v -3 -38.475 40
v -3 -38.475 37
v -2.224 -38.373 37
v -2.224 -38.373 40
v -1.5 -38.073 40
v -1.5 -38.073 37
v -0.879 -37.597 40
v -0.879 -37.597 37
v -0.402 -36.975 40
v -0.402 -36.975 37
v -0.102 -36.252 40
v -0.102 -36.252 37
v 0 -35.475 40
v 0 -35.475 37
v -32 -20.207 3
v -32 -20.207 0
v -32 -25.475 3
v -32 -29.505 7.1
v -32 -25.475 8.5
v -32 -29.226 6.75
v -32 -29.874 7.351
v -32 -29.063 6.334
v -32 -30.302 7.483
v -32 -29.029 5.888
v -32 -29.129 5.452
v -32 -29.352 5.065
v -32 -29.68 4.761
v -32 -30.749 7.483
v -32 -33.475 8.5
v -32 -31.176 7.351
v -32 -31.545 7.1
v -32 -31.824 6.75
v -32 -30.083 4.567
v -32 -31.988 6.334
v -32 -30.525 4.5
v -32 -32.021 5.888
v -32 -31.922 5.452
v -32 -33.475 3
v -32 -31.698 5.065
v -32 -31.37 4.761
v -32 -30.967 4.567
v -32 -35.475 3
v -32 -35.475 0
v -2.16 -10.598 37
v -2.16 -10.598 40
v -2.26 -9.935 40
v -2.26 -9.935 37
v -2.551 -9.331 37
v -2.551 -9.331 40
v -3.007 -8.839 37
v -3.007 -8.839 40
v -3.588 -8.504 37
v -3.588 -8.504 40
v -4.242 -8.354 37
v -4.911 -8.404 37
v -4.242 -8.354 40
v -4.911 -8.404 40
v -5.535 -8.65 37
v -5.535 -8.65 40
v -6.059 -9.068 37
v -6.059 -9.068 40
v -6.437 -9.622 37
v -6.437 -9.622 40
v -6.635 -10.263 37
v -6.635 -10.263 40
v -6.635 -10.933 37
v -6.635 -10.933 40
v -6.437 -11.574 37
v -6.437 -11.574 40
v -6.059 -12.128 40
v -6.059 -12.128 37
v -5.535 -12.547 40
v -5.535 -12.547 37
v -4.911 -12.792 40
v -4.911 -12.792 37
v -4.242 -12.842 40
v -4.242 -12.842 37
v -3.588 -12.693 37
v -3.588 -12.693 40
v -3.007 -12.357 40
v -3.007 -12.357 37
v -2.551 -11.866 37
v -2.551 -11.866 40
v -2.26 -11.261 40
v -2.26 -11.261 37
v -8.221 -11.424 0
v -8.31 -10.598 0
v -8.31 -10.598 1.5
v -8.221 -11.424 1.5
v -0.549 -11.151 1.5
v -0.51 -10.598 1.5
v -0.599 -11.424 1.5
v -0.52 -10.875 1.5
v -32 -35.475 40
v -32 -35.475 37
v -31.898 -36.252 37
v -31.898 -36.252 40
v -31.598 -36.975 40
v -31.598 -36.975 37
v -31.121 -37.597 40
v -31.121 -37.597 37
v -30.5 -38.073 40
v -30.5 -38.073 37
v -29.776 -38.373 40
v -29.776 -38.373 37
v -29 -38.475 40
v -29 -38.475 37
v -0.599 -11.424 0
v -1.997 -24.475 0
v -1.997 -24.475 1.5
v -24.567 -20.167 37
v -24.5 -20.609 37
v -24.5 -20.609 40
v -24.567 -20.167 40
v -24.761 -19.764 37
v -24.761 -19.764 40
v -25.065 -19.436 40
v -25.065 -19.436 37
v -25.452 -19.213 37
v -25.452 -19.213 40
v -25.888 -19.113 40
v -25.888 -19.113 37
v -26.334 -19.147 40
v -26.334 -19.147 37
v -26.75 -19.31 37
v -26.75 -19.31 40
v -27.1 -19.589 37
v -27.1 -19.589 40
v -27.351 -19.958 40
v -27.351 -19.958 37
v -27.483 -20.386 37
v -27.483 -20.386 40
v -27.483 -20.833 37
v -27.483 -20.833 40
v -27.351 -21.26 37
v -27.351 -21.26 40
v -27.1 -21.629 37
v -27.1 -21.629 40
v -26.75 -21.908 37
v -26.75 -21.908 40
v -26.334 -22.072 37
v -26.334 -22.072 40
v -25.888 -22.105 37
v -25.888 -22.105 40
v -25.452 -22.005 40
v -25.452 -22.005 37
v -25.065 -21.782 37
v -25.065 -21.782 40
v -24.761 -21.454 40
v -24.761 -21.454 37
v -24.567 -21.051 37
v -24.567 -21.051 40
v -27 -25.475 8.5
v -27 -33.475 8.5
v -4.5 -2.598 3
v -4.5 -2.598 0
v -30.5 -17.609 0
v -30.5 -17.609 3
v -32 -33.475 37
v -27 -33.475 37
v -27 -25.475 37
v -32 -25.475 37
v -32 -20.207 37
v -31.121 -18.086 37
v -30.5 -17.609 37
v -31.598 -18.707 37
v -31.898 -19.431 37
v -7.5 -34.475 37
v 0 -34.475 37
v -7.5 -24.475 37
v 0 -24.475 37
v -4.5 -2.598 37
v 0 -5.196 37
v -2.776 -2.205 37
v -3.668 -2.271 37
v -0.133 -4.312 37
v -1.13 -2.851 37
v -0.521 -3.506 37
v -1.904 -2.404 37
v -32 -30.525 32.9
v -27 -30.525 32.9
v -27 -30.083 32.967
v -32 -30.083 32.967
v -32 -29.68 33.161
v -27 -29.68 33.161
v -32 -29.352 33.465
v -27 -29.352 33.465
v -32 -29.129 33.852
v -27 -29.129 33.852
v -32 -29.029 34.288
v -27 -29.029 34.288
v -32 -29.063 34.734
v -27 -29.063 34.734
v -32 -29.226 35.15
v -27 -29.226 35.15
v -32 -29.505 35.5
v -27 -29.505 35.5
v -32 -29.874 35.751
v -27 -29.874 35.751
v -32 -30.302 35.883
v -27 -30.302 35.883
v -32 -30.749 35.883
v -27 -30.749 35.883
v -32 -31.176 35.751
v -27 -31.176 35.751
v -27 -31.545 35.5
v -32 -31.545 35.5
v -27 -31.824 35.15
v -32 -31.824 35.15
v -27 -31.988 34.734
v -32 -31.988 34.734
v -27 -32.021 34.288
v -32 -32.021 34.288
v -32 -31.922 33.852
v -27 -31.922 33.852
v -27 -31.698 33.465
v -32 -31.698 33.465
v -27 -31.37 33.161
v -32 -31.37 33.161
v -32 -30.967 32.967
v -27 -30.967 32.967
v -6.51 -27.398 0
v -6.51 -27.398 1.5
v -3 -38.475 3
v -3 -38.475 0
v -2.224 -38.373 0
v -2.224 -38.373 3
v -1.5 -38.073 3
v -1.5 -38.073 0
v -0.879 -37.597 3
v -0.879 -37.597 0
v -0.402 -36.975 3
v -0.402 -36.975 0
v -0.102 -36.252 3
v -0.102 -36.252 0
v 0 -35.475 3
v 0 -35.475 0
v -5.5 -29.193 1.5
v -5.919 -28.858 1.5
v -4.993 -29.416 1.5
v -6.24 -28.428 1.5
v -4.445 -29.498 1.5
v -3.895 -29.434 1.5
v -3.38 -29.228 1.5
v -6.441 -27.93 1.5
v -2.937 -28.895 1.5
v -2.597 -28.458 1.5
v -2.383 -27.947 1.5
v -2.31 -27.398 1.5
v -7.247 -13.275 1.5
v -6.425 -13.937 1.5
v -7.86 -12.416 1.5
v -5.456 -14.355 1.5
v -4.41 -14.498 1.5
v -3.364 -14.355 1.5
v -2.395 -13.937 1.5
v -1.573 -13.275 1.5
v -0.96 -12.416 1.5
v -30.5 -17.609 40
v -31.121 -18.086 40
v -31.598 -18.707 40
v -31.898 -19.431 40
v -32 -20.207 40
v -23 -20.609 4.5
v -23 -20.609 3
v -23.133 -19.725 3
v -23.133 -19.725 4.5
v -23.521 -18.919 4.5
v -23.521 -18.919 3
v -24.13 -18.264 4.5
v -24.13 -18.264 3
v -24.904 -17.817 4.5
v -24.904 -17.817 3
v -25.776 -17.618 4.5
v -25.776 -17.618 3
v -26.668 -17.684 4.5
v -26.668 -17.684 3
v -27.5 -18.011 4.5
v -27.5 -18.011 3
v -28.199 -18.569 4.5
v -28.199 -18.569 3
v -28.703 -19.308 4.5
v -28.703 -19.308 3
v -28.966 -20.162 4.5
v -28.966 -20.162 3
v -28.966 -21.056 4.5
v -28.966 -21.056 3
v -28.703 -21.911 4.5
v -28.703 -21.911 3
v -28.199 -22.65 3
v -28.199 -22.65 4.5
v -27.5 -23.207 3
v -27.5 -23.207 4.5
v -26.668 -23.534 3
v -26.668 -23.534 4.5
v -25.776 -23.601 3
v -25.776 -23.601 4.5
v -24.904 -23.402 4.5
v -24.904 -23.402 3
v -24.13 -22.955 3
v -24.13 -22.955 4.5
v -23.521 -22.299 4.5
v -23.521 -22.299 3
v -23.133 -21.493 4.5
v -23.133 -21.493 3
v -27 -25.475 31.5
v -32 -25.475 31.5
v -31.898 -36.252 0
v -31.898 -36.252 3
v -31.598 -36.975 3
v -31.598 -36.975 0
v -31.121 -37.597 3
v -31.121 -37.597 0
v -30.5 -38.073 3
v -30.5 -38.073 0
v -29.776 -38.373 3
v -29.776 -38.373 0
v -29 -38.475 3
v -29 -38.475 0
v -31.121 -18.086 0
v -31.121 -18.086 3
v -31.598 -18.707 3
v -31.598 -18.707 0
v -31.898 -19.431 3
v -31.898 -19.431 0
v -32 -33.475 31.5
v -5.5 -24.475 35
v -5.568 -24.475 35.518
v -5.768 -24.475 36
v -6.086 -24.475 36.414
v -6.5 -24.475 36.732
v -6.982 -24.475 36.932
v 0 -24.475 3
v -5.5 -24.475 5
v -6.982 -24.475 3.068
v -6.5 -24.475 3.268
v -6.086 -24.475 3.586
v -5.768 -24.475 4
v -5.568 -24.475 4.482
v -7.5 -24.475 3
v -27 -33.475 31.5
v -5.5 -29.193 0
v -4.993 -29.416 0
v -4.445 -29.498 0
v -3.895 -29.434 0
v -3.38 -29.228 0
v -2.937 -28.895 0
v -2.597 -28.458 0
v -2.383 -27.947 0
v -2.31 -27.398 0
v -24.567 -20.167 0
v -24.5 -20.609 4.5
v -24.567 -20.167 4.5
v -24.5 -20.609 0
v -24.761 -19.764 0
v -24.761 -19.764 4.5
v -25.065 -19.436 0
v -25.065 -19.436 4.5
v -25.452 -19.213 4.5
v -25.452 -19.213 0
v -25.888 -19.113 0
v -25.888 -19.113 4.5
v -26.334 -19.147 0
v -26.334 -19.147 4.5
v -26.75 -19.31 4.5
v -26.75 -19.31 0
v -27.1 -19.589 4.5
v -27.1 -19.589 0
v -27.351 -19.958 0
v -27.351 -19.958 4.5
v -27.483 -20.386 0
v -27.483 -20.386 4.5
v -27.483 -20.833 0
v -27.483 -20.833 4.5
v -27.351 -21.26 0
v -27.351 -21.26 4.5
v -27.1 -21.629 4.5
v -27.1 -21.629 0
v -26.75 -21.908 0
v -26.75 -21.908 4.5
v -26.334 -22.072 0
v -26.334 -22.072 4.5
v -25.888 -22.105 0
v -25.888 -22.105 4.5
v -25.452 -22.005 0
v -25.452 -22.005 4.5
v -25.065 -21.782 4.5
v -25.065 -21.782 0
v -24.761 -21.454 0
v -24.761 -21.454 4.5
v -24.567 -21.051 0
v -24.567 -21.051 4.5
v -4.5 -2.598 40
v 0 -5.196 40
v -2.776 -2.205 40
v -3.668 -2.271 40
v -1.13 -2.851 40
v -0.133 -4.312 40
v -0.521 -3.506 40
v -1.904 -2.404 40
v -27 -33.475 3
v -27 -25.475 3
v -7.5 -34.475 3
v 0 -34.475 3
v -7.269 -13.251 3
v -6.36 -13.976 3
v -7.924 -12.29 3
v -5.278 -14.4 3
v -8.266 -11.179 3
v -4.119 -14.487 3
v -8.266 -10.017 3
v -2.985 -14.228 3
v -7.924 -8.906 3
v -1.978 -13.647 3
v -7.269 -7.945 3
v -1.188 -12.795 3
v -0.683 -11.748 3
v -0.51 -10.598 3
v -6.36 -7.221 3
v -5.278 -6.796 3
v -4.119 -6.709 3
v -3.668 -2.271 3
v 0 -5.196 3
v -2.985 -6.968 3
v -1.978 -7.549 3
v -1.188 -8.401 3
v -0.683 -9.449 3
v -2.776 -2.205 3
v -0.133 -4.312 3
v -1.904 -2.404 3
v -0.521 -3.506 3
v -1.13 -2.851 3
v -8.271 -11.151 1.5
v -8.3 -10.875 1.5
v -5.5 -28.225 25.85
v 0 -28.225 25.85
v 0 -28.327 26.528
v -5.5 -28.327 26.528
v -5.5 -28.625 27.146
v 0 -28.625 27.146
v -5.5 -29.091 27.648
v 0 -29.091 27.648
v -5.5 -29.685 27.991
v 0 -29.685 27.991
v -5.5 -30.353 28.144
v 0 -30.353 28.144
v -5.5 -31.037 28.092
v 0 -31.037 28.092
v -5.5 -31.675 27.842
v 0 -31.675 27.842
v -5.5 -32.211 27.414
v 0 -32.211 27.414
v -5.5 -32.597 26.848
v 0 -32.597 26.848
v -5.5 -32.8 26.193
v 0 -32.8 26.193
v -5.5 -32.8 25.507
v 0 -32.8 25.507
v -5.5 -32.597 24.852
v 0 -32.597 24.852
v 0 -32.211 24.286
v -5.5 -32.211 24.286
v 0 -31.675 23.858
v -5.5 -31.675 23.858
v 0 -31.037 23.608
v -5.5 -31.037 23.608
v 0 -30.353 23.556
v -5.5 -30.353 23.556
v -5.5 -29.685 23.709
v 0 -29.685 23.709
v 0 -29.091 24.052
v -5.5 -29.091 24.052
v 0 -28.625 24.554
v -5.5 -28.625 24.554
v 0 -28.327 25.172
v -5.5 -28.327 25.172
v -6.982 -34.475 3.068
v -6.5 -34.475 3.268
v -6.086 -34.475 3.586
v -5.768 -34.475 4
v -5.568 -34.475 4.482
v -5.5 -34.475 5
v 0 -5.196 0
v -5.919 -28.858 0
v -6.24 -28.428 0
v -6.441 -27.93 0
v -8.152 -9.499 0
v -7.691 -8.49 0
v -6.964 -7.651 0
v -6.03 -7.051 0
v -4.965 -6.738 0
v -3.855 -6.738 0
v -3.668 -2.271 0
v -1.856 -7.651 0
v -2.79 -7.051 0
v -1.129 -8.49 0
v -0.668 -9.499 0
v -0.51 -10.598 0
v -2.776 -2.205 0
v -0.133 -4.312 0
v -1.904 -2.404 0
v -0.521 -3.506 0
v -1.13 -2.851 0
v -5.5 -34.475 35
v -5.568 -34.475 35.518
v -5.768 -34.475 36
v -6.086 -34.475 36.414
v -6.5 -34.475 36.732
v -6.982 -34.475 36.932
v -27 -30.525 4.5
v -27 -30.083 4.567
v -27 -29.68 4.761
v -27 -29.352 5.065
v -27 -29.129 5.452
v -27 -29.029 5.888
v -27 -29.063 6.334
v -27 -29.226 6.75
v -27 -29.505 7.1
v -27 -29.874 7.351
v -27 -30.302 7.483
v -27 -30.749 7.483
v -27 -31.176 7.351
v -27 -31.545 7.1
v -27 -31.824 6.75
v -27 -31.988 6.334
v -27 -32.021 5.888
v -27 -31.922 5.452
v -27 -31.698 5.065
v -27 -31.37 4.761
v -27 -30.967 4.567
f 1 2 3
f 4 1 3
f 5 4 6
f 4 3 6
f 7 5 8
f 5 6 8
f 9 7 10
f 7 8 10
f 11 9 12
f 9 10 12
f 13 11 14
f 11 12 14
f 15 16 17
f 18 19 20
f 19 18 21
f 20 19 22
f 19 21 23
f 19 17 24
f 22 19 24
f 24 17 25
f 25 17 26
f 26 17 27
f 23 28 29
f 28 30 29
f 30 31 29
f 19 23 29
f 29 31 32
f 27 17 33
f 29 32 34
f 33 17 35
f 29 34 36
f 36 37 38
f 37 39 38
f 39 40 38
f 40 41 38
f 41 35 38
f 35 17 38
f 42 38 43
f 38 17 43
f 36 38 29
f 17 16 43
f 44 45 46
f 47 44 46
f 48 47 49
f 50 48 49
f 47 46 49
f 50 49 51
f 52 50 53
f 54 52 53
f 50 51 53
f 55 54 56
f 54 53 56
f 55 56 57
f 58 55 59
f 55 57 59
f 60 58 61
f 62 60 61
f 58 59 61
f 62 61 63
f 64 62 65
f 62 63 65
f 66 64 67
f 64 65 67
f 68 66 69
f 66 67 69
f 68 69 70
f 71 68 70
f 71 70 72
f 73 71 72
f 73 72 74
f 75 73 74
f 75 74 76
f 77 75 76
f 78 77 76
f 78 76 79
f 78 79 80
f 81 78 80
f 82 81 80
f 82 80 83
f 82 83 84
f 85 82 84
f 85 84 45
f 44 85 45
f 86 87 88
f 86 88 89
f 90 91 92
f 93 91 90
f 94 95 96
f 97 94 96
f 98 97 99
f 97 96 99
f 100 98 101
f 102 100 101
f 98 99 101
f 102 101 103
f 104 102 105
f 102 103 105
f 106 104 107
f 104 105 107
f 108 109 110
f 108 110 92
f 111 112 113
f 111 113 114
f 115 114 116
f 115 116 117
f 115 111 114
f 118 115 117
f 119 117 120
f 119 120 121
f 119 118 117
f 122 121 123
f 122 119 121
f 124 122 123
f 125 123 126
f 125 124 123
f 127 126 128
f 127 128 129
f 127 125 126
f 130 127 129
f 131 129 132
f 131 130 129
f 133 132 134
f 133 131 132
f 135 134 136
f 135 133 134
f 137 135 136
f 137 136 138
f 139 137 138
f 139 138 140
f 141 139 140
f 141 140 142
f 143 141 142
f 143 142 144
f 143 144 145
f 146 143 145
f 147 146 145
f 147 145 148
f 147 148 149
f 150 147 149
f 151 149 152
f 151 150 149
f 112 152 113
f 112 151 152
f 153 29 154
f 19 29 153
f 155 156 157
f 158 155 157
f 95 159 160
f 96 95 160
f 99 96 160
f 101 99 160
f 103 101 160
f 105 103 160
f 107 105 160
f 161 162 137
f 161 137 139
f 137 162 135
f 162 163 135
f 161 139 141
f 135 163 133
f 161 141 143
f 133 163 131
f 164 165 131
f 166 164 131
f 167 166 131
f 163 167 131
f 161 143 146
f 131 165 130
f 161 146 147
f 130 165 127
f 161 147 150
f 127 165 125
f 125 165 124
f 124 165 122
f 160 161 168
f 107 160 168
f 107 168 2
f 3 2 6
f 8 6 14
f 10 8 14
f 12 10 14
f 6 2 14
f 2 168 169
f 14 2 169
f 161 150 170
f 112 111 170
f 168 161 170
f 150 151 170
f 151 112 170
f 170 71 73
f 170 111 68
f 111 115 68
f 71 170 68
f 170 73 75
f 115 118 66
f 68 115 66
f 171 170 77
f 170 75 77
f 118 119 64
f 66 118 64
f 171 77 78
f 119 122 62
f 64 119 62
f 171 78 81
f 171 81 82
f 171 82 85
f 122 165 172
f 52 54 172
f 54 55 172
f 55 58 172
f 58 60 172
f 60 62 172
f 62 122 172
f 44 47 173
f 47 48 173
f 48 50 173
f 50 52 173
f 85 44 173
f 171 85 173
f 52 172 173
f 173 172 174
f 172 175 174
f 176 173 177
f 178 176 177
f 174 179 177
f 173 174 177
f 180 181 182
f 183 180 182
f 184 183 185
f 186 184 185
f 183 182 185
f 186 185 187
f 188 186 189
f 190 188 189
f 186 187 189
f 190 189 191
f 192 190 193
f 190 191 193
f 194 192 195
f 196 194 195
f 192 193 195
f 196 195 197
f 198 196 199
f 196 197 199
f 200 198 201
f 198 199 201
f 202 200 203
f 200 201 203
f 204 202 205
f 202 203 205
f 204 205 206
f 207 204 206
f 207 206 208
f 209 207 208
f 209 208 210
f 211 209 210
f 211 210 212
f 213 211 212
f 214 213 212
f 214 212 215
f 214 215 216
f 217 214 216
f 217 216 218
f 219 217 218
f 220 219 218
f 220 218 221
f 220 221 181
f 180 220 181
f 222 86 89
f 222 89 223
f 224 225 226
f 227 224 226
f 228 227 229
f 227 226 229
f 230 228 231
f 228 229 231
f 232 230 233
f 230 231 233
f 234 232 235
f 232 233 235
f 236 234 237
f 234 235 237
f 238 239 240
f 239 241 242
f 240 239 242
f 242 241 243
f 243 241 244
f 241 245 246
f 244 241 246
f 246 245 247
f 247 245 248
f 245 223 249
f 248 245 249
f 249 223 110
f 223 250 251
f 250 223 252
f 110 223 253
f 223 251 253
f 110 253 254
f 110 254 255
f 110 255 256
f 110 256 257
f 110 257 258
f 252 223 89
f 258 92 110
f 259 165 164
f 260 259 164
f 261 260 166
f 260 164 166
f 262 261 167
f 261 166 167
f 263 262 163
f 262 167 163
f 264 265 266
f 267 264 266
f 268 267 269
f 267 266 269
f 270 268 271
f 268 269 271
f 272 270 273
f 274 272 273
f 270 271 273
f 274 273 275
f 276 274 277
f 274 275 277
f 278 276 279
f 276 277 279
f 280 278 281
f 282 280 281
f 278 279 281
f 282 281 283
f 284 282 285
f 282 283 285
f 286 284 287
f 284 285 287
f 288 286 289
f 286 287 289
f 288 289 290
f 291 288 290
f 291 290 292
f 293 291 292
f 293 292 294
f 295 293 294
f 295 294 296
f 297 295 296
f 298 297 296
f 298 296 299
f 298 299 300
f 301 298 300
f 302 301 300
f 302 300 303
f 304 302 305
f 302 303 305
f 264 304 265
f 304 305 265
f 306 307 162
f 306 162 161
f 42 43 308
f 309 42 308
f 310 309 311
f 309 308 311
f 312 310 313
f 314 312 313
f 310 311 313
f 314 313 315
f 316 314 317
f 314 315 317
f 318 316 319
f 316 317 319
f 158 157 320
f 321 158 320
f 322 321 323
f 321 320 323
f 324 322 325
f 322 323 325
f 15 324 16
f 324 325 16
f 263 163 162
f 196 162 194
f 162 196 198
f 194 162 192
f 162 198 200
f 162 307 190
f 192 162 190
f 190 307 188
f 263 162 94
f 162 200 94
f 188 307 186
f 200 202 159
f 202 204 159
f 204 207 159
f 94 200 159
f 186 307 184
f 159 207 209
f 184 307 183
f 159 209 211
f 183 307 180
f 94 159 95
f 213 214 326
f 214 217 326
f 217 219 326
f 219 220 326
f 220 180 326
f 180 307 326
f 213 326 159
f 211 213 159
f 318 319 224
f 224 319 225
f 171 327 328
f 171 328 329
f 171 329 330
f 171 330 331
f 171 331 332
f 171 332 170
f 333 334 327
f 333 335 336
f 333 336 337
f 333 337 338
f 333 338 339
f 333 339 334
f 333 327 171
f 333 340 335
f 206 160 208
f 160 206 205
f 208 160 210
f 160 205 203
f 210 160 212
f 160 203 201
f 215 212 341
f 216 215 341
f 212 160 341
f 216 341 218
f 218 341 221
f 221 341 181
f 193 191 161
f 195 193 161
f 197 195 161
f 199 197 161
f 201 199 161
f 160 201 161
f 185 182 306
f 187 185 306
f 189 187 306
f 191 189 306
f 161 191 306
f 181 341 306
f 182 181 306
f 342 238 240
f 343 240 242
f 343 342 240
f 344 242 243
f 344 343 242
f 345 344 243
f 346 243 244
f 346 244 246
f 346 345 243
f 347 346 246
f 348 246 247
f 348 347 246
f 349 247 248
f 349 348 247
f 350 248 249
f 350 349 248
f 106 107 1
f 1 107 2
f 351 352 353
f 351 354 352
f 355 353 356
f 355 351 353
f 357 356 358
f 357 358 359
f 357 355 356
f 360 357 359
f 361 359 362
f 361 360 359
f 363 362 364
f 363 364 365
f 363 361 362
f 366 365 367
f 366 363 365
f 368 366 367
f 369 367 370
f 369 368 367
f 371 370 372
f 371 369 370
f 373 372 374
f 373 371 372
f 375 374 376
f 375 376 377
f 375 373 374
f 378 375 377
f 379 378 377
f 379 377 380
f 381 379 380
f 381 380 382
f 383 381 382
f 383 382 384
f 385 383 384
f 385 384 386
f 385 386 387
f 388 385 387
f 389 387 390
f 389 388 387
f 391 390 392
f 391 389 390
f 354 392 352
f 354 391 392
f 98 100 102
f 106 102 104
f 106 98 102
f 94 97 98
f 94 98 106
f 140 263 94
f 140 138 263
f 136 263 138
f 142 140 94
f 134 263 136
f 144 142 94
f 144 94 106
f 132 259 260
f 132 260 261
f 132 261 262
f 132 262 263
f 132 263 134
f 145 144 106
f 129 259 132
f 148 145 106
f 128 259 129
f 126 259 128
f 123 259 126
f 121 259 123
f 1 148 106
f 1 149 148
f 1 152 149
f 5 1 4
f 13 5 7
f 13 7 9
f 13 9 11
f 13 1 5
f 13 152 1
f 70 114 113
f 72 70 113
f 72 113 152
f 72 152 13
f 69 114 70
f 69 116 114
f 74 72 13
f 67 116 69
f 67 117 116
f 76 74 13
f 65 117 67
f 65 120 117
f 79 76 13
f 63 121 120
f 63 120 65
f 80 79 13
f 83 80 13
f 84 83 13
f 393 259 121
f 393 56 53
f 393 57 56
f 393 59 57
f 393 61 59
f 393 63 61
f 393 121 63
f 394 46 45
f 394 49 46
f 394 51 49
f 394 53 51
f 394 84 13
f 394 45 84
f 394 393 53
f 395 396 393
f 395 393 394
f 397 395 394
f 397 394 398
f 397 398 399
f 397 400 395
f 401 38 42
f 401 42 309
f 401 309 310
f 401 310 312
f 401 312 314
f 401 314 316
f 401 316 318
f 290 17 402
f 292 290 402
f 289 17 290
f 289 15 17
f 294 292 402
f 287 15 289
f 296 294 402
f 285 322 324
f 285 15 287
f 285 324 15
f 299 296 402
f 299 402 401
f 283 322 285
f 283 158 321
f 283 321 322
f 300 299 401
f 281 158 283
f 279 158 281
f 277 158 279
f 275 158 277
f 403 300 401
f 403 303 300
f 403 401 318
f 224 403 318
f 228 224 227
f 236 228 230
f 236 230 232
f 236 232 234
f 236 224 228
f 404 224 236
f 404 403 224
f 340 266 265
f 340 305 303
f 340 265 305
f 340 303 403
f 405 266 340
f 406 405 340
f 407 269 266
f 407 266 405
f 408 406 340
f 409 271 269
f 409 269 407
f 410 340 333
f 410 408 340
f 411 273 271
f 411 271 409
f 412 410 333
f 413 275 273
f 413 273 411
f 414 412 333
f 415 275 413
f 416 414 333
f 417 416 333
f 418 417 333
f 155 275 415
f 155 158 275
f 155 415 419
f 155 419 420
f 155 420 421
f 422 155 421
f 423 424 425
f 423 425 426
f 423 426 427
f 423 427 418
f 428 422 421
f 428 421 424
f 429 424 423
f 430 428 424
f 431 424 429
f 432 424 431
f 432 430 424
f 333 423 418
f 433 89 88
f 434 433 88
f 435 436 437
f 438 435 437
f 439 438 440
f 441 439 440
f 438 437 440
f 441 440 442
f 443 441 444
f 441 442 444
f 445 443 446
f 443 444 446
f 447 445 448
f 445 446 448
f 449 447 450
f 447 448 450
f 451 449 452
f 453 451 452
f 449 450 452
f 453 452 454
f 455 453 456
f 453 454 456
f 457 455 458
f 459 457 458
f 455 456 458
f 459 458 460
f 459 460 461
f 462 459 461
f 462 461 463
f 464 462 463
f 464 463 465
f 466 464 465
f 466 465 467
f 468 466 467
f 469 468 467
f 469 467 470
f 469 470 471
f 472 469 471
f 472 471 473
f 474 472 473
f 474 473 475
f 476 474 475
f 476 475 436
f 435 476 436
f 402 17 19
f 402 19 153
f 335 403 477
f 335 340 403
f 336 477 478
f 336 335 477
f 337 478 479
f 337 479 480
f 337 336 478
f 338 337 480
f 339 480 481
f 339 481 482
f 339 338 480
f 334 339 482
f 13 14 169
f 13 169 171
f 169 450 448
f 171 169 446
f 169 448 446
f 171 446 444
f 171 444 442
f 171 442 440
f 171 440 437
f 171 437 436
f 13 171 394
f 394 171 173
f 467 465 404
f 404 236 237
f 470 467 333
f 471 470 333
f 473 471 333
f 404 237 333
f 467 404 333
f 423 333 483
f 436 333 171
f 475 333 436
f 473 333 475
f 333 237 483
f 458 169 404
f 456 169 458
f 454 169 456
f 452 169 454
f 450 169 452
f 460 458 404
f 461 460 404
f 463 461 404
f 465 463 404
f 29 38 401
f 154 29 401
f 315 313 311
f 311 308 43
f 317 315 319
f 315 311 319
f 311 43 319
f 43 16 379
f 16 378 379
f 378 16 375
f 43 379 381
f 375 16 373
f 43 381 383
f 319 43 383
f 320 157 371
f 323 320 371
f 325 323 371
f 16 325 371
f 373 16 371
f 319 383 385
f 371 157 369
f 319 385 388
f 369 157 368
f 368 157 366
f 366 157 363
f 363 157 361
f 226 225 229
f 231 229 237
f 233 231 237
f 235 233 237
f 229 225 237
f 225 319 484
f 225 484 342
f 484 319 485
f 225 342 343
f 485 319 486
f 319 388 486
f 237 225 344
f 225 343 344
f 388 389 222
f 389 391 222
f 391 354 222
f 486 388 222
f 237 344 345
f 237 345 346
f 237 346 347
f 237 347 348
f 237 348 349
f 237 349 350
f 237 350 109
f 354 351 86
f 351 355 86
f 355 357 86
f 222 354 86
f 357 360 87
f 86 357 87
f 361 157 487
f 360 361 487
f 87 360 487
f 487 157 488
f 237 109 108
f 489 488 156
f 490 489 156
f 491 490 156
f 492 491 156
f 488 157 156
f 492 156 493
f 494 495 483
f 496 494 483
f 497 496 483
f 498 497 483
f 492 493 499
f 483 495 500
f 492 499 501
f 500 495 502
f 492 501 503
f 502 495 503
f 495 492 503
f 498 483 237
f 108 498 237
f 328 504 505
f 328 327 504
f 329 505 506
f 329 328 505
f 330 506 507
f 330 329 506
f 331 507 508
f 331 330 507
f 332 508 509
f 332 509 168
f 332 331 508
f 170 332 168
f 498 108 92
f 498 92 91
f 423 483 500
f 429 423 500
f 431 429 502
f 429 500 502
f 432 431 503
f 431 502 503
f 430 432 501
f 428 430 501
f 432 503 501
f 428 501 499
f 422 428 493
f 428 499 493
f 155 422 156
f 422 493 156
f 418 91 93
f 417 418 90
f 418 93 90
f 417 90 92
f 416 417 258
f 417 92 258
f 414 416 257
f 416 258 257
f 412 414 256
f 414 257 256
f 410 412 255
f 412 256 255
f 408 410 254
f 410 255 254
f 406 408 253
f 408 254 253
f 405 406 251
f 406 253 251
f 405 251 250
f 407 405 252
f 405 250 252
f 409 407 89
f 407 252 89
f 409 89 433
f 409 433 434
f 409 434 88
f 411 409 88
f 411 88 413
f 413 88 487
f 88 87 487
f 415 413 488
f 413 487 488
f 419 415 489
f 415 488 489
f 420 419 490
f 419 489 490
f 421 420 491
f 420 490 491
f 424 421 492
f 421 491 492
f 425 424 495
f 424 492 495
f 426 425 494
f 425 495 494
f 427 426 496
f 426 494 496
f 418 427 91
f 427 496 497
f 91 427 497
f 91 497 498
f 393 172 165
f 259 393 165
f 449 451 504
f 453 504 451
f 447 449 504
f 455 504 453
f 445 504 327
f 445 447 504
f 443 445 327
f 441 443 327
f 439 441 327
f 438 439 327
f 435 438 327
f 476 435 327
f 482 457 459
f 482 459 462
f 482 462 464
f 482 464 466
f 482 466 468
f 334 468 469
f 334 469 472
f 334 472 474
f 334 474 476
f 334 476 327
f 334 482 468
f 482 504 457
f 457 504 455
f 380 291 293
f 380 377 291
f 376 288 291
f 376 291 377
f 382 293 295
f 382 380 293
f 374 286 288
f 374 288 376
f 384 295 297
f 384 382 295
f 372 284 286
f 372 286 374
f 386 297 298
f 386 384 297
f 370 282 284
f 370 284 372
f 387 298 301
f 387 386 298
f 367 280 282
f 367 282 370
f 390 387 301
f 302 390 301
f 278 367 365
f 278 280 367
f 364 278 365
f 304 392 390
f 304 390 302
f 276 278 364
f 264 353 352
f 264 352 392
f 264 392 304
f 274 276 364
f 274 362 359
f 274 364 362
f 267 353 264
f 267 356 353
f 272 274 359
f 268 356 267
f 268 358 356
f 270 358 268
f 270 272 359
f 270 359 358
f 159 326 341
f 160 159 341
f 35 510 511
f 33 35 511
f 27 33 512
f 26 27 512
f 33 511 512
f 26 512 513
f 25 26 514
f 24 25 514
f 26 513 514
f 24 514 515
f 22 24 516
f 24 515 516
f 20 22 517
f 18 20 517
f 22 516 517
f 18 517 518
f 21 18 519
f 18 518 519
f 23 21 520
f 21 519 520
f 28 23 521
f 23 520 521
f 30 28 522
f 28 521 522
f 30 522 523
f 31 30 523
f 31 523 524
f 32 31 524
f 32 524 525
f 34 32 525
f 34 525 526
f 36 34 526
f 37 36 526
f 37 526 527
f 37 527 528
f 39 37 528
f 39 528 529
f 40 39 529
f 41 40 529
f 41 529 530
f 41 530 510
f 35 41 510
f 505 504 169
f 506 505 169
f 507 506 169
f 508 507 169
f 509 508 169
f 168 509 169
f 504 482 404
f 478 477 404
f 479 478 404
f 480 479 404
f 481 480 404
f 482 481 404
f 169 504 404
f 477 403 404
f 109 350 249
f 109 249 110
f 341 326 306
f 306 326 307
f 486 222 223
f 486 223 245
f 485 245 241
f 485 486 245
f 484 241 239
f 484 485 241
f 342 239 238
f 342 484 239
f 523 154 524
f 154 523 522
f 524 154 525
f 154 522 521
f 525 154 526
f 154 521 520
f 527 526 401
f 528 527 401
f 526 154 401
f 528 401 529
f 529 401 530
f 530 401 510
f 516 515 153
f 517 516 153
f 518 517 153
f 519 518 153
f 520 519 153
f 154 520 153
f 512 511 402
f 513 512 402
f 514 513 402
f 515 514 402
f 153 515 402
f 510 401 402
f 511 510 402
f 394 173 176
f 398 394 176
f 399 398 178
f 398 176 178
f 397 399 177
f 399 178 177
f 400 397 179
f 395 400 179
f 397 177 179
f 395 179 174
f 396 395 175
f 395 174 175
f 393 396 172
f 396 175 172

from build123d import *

# Parameters (mm, degrees)
SKETCH1_R           = 1.5
BOSS_EXTRUDE1_DEPTH = 3
SKETCH2_W           = 5
SKETCH2_H           = 8
BOSS_EXTRUDE2_DEPTH = 34
LPATTERN1_COUNT     = 2
LPATTERN1_PITCH     = 37
SKETCH3_W           = 5.5
SKETCH3_H           = 10
BOSS_EXTRUDE4_DEPTH = 34
SKETCH5_W           = 23
SKETCH5_H           = 8
CUT_EXTRUDE1_DEPTH  = 10
CUT_EXTRUDE11_START = -3.7
SKETCH9_R           = 1.5
CUT_EXTRUDE11_DEPTH = 2.2
SKETCH11_R          = 3
SKETCH11_R_2        = 1.5
BOSS_EXTRUDE5_DEPTH = 1.5
SKETCH12_R          = 1.5
CUT_EXTRUDE13_DEPTH = 62.719864532
SKETCH14_R          = 3.9
CUT_EXTRUDE15_DEPTH = 10
SKETCH15_R          = 2.3
CUT_EXTRUDE16_DEPTH = 65.065136212
SKETCH16_R          = 2.25
CUT_EXTRUDE17_DEPTH = 65.065136212
FILLET1_R           = 2


with BuildPart() as part:
    # Sketch1 → Boss-Extrude1 (new body)
    with BuildSketch(Plane.XY):
        with BuildLine():
            Line((-4.5, -2.598076211), (-30.5, -17.60918321))
            ThreePointArc((-30.5, -17.60918321), (-31.598076211, -18.707259422), (-32, -20.207259422))
            Line((-32, -20.207259422), (-32, -35.475208614))
            ThreePointArc((-32, -35.475208614), (-31.121320344, -37.596528958), (-29, -38.475208614))
            Line((-29, -38.475208614), (-3, -38.475208614))
            ThreePointArc((-3, -38.475208614), (-0.878679656, -37.596528958), (0, -35.475208614))
            Line((0, -35.475208614), (0, -5.196152423))
            ThreePointArc((0, -5.196152423), (-1.5, -2.598076211), (-4.5, -2.598076211))
        make_face()
        with Locations((-26, -20.60918321)):
            Circle(SKETCH1_R, mode=Mode.SUBTRACT)
        with Locations((-4.41, -10.598076211)):
            Circle(SKETCH1_R, mode=Mode.SUBTRACT)
    boss_extrude1 = extrude(amount=BOSS_EXTRUDE1_DEPTH)

    # Sketch2 → Boss-Extrude2 (add)
    with BuildSketch(Plane.XY.offset(3)):
        with Locations((-29.5, -29.475208614)):
            Rectangle(SKETCH2_W, SKETCH2_H)
    extrude(amount=BOSS_EXTRUDE2_DEPTH)

    # LPattern1: Boss-Extrude1 ×2
    with Locations(*[(0, 0, i * LPATTERN1_PITCH) for i in range(1, LPATTERN1_COUNT)]):
        add(boss_extrude1)

    # Sketch3 → Boss-Extrude4 (add)
    with BuildSketch(Plane.XY.offset(3)):
        with Locations((-2.75, -29.475208614)):
            Rectangle(SKETCH3_W, SKETCH3_H)
    extrude(amount=BOSS_EXTRUDE4_DEPTH)

    # Sketch5 → Cut-Extrude1 (cut)
    with BuildSketch(Plane.ZY.offset(32)):
        with Locations((20, -29.475208614)):
            Rectangle(SKETCH5_W, SKETCH5_H)
    extrude(amount=-CUT_EXTRUDE1_DEPTH, mode=Mode.SUBTRACT)

    # Sketch9 → Cut-Extrude11 (cut)
    # profile 1 of 2: a face of its own
    with BuildSketch(Plane.XY.offset(3).offset(CUT_EXTRUDE11_START)):
        with BuildLine():
            Line((-8.22147541, -11.42430572), (-6.51, -27.398076211))
            ThreePointArc((-6.51, -27.398076211), (-6.240163927, -28.427882018), (-5.5, -29.193041392))
            Line((-5.5, -29.193041392), (-5.5, -24.475208614))
            Line((-5.5, -24.475208614), (-1.996835615, -24.475208614))
            Line((-1.996835615, -24.475208614), (-0.59852459, -11.42430572))
            Line((-0.59852459, -11.42430572), (-0.51, -10.598076211))
            ThreePointArc((-0.51, -10.598076211), (-4.41, -6.698076211), (-8.31, -10.598076211))
            Line((-8.31, -10.598076211), (-8.22147541, -11.42430572))
        make_face()
        with Locations((-4.41, -10.598076211)):
            Circle(SKETCH9_R, mode=Mode.SUBTRACT)
    # profile 2 of 2: a face of its own
    with BuildSketch(Plane.XY.offset(3).offset(CUT_EXTRUDE11_START)):
        with BuildLine():
            Line((-5.5, -24.475208614), (-5.5, -29.193041392))
            ThreePointArc((-5.5, -29.193041392), (-3.380194193, -29.228240138), (-2.31, -27.398076211))
            Line((-2.31, -27.398076211), (-1.996835615, -24.475208614))
            Line((-1.996835615, -24.475208614), (-5.5, -24.475208614))
        make_face()
    extrude(amount=CUT_EXTRUDE11_DEPTH, mode=Mode.SUBTRACT)

    # Sketch11 → Boss-Extrude5 (add)
    with BuildSketch(Plane.XY.offset(3)):
        with Locations((-26, -20.60918321)):
            Circle(SKETCH11_R)
        with Locations((-26, -20.60918321)):
            Circle(SKETCH11_R_2, mode=Mode.SUBTRACT)
    extrude(amount=BOSS_EXTRUDE5_DEPTH)

    # Sketch12 → Cut-Extrude13 (cut, through all)
    with BuildSketch(Plane(origin=(-27, 0, 0), x_dir=(0, 0, -1), z_dir=(1, 0, 0))):
        with Locations((-34.4, -30.525208614)):
            Circle(SKETCH12_R)
        with Locations((-6, -30.525208614)):
            Circle(SKETCH12_R)
    extrude(amount=-CUT_EXTRUDE13_DEPTH, mode=Mode.SUBTRACT)

    # Sketch14 → Cut-Extrude15 (cut)
    with BuildSketch(Plane(origin=(0, 0, 1.5), x_dir=(-1, 0, 0), z_dir=(0, 0, -1))):
        with Locations(Location((4.41, -10.598076211, 0), (0, 0, 180))):
            Circle(SKETCH14_R)
    extrude(amount=-CUT_EXTRUDE15_DEPTH, mode=Mode.SUBTRACT)

    # Sketch15 → Cut-Extrude16 (cut, through all)
    with BuildSketch(Plane(origin=(0, 0, 0), x_dir=(0, 0, -1), z_dir=(1, 0, 0))):
        with Locations(Location((-25.85, -30.525208614, 0), (0, 0, 90))):
            Circle(SKETCH15_R)
    extrude(amount=-CUT_EXTRUDE16_DEPTH, mode=Mode.SUBTRACT)

    # Sketch16 → Cut-Extrude17 (cut, through all)
    with BuildSketch(Plane.XY.offset(40)):
        with Locations((-4.41, -10.598076211)):
            Circle(SKETCH16_R)
    extrude(amount=-CUT_EXTRUDE17_DEPTH, mode=Mode.SUBTRACT)

    # Fillet1
    fillet1_edges = [part.edges().sort_by_distance(p)[0] for p in [
        (-5.5, -29.475208614, 3),
        (-5.5, -29.475208614, 37),
    ]]
    fillet(fillet1_edges, radius=FILLET1_R)


solid = part.part
